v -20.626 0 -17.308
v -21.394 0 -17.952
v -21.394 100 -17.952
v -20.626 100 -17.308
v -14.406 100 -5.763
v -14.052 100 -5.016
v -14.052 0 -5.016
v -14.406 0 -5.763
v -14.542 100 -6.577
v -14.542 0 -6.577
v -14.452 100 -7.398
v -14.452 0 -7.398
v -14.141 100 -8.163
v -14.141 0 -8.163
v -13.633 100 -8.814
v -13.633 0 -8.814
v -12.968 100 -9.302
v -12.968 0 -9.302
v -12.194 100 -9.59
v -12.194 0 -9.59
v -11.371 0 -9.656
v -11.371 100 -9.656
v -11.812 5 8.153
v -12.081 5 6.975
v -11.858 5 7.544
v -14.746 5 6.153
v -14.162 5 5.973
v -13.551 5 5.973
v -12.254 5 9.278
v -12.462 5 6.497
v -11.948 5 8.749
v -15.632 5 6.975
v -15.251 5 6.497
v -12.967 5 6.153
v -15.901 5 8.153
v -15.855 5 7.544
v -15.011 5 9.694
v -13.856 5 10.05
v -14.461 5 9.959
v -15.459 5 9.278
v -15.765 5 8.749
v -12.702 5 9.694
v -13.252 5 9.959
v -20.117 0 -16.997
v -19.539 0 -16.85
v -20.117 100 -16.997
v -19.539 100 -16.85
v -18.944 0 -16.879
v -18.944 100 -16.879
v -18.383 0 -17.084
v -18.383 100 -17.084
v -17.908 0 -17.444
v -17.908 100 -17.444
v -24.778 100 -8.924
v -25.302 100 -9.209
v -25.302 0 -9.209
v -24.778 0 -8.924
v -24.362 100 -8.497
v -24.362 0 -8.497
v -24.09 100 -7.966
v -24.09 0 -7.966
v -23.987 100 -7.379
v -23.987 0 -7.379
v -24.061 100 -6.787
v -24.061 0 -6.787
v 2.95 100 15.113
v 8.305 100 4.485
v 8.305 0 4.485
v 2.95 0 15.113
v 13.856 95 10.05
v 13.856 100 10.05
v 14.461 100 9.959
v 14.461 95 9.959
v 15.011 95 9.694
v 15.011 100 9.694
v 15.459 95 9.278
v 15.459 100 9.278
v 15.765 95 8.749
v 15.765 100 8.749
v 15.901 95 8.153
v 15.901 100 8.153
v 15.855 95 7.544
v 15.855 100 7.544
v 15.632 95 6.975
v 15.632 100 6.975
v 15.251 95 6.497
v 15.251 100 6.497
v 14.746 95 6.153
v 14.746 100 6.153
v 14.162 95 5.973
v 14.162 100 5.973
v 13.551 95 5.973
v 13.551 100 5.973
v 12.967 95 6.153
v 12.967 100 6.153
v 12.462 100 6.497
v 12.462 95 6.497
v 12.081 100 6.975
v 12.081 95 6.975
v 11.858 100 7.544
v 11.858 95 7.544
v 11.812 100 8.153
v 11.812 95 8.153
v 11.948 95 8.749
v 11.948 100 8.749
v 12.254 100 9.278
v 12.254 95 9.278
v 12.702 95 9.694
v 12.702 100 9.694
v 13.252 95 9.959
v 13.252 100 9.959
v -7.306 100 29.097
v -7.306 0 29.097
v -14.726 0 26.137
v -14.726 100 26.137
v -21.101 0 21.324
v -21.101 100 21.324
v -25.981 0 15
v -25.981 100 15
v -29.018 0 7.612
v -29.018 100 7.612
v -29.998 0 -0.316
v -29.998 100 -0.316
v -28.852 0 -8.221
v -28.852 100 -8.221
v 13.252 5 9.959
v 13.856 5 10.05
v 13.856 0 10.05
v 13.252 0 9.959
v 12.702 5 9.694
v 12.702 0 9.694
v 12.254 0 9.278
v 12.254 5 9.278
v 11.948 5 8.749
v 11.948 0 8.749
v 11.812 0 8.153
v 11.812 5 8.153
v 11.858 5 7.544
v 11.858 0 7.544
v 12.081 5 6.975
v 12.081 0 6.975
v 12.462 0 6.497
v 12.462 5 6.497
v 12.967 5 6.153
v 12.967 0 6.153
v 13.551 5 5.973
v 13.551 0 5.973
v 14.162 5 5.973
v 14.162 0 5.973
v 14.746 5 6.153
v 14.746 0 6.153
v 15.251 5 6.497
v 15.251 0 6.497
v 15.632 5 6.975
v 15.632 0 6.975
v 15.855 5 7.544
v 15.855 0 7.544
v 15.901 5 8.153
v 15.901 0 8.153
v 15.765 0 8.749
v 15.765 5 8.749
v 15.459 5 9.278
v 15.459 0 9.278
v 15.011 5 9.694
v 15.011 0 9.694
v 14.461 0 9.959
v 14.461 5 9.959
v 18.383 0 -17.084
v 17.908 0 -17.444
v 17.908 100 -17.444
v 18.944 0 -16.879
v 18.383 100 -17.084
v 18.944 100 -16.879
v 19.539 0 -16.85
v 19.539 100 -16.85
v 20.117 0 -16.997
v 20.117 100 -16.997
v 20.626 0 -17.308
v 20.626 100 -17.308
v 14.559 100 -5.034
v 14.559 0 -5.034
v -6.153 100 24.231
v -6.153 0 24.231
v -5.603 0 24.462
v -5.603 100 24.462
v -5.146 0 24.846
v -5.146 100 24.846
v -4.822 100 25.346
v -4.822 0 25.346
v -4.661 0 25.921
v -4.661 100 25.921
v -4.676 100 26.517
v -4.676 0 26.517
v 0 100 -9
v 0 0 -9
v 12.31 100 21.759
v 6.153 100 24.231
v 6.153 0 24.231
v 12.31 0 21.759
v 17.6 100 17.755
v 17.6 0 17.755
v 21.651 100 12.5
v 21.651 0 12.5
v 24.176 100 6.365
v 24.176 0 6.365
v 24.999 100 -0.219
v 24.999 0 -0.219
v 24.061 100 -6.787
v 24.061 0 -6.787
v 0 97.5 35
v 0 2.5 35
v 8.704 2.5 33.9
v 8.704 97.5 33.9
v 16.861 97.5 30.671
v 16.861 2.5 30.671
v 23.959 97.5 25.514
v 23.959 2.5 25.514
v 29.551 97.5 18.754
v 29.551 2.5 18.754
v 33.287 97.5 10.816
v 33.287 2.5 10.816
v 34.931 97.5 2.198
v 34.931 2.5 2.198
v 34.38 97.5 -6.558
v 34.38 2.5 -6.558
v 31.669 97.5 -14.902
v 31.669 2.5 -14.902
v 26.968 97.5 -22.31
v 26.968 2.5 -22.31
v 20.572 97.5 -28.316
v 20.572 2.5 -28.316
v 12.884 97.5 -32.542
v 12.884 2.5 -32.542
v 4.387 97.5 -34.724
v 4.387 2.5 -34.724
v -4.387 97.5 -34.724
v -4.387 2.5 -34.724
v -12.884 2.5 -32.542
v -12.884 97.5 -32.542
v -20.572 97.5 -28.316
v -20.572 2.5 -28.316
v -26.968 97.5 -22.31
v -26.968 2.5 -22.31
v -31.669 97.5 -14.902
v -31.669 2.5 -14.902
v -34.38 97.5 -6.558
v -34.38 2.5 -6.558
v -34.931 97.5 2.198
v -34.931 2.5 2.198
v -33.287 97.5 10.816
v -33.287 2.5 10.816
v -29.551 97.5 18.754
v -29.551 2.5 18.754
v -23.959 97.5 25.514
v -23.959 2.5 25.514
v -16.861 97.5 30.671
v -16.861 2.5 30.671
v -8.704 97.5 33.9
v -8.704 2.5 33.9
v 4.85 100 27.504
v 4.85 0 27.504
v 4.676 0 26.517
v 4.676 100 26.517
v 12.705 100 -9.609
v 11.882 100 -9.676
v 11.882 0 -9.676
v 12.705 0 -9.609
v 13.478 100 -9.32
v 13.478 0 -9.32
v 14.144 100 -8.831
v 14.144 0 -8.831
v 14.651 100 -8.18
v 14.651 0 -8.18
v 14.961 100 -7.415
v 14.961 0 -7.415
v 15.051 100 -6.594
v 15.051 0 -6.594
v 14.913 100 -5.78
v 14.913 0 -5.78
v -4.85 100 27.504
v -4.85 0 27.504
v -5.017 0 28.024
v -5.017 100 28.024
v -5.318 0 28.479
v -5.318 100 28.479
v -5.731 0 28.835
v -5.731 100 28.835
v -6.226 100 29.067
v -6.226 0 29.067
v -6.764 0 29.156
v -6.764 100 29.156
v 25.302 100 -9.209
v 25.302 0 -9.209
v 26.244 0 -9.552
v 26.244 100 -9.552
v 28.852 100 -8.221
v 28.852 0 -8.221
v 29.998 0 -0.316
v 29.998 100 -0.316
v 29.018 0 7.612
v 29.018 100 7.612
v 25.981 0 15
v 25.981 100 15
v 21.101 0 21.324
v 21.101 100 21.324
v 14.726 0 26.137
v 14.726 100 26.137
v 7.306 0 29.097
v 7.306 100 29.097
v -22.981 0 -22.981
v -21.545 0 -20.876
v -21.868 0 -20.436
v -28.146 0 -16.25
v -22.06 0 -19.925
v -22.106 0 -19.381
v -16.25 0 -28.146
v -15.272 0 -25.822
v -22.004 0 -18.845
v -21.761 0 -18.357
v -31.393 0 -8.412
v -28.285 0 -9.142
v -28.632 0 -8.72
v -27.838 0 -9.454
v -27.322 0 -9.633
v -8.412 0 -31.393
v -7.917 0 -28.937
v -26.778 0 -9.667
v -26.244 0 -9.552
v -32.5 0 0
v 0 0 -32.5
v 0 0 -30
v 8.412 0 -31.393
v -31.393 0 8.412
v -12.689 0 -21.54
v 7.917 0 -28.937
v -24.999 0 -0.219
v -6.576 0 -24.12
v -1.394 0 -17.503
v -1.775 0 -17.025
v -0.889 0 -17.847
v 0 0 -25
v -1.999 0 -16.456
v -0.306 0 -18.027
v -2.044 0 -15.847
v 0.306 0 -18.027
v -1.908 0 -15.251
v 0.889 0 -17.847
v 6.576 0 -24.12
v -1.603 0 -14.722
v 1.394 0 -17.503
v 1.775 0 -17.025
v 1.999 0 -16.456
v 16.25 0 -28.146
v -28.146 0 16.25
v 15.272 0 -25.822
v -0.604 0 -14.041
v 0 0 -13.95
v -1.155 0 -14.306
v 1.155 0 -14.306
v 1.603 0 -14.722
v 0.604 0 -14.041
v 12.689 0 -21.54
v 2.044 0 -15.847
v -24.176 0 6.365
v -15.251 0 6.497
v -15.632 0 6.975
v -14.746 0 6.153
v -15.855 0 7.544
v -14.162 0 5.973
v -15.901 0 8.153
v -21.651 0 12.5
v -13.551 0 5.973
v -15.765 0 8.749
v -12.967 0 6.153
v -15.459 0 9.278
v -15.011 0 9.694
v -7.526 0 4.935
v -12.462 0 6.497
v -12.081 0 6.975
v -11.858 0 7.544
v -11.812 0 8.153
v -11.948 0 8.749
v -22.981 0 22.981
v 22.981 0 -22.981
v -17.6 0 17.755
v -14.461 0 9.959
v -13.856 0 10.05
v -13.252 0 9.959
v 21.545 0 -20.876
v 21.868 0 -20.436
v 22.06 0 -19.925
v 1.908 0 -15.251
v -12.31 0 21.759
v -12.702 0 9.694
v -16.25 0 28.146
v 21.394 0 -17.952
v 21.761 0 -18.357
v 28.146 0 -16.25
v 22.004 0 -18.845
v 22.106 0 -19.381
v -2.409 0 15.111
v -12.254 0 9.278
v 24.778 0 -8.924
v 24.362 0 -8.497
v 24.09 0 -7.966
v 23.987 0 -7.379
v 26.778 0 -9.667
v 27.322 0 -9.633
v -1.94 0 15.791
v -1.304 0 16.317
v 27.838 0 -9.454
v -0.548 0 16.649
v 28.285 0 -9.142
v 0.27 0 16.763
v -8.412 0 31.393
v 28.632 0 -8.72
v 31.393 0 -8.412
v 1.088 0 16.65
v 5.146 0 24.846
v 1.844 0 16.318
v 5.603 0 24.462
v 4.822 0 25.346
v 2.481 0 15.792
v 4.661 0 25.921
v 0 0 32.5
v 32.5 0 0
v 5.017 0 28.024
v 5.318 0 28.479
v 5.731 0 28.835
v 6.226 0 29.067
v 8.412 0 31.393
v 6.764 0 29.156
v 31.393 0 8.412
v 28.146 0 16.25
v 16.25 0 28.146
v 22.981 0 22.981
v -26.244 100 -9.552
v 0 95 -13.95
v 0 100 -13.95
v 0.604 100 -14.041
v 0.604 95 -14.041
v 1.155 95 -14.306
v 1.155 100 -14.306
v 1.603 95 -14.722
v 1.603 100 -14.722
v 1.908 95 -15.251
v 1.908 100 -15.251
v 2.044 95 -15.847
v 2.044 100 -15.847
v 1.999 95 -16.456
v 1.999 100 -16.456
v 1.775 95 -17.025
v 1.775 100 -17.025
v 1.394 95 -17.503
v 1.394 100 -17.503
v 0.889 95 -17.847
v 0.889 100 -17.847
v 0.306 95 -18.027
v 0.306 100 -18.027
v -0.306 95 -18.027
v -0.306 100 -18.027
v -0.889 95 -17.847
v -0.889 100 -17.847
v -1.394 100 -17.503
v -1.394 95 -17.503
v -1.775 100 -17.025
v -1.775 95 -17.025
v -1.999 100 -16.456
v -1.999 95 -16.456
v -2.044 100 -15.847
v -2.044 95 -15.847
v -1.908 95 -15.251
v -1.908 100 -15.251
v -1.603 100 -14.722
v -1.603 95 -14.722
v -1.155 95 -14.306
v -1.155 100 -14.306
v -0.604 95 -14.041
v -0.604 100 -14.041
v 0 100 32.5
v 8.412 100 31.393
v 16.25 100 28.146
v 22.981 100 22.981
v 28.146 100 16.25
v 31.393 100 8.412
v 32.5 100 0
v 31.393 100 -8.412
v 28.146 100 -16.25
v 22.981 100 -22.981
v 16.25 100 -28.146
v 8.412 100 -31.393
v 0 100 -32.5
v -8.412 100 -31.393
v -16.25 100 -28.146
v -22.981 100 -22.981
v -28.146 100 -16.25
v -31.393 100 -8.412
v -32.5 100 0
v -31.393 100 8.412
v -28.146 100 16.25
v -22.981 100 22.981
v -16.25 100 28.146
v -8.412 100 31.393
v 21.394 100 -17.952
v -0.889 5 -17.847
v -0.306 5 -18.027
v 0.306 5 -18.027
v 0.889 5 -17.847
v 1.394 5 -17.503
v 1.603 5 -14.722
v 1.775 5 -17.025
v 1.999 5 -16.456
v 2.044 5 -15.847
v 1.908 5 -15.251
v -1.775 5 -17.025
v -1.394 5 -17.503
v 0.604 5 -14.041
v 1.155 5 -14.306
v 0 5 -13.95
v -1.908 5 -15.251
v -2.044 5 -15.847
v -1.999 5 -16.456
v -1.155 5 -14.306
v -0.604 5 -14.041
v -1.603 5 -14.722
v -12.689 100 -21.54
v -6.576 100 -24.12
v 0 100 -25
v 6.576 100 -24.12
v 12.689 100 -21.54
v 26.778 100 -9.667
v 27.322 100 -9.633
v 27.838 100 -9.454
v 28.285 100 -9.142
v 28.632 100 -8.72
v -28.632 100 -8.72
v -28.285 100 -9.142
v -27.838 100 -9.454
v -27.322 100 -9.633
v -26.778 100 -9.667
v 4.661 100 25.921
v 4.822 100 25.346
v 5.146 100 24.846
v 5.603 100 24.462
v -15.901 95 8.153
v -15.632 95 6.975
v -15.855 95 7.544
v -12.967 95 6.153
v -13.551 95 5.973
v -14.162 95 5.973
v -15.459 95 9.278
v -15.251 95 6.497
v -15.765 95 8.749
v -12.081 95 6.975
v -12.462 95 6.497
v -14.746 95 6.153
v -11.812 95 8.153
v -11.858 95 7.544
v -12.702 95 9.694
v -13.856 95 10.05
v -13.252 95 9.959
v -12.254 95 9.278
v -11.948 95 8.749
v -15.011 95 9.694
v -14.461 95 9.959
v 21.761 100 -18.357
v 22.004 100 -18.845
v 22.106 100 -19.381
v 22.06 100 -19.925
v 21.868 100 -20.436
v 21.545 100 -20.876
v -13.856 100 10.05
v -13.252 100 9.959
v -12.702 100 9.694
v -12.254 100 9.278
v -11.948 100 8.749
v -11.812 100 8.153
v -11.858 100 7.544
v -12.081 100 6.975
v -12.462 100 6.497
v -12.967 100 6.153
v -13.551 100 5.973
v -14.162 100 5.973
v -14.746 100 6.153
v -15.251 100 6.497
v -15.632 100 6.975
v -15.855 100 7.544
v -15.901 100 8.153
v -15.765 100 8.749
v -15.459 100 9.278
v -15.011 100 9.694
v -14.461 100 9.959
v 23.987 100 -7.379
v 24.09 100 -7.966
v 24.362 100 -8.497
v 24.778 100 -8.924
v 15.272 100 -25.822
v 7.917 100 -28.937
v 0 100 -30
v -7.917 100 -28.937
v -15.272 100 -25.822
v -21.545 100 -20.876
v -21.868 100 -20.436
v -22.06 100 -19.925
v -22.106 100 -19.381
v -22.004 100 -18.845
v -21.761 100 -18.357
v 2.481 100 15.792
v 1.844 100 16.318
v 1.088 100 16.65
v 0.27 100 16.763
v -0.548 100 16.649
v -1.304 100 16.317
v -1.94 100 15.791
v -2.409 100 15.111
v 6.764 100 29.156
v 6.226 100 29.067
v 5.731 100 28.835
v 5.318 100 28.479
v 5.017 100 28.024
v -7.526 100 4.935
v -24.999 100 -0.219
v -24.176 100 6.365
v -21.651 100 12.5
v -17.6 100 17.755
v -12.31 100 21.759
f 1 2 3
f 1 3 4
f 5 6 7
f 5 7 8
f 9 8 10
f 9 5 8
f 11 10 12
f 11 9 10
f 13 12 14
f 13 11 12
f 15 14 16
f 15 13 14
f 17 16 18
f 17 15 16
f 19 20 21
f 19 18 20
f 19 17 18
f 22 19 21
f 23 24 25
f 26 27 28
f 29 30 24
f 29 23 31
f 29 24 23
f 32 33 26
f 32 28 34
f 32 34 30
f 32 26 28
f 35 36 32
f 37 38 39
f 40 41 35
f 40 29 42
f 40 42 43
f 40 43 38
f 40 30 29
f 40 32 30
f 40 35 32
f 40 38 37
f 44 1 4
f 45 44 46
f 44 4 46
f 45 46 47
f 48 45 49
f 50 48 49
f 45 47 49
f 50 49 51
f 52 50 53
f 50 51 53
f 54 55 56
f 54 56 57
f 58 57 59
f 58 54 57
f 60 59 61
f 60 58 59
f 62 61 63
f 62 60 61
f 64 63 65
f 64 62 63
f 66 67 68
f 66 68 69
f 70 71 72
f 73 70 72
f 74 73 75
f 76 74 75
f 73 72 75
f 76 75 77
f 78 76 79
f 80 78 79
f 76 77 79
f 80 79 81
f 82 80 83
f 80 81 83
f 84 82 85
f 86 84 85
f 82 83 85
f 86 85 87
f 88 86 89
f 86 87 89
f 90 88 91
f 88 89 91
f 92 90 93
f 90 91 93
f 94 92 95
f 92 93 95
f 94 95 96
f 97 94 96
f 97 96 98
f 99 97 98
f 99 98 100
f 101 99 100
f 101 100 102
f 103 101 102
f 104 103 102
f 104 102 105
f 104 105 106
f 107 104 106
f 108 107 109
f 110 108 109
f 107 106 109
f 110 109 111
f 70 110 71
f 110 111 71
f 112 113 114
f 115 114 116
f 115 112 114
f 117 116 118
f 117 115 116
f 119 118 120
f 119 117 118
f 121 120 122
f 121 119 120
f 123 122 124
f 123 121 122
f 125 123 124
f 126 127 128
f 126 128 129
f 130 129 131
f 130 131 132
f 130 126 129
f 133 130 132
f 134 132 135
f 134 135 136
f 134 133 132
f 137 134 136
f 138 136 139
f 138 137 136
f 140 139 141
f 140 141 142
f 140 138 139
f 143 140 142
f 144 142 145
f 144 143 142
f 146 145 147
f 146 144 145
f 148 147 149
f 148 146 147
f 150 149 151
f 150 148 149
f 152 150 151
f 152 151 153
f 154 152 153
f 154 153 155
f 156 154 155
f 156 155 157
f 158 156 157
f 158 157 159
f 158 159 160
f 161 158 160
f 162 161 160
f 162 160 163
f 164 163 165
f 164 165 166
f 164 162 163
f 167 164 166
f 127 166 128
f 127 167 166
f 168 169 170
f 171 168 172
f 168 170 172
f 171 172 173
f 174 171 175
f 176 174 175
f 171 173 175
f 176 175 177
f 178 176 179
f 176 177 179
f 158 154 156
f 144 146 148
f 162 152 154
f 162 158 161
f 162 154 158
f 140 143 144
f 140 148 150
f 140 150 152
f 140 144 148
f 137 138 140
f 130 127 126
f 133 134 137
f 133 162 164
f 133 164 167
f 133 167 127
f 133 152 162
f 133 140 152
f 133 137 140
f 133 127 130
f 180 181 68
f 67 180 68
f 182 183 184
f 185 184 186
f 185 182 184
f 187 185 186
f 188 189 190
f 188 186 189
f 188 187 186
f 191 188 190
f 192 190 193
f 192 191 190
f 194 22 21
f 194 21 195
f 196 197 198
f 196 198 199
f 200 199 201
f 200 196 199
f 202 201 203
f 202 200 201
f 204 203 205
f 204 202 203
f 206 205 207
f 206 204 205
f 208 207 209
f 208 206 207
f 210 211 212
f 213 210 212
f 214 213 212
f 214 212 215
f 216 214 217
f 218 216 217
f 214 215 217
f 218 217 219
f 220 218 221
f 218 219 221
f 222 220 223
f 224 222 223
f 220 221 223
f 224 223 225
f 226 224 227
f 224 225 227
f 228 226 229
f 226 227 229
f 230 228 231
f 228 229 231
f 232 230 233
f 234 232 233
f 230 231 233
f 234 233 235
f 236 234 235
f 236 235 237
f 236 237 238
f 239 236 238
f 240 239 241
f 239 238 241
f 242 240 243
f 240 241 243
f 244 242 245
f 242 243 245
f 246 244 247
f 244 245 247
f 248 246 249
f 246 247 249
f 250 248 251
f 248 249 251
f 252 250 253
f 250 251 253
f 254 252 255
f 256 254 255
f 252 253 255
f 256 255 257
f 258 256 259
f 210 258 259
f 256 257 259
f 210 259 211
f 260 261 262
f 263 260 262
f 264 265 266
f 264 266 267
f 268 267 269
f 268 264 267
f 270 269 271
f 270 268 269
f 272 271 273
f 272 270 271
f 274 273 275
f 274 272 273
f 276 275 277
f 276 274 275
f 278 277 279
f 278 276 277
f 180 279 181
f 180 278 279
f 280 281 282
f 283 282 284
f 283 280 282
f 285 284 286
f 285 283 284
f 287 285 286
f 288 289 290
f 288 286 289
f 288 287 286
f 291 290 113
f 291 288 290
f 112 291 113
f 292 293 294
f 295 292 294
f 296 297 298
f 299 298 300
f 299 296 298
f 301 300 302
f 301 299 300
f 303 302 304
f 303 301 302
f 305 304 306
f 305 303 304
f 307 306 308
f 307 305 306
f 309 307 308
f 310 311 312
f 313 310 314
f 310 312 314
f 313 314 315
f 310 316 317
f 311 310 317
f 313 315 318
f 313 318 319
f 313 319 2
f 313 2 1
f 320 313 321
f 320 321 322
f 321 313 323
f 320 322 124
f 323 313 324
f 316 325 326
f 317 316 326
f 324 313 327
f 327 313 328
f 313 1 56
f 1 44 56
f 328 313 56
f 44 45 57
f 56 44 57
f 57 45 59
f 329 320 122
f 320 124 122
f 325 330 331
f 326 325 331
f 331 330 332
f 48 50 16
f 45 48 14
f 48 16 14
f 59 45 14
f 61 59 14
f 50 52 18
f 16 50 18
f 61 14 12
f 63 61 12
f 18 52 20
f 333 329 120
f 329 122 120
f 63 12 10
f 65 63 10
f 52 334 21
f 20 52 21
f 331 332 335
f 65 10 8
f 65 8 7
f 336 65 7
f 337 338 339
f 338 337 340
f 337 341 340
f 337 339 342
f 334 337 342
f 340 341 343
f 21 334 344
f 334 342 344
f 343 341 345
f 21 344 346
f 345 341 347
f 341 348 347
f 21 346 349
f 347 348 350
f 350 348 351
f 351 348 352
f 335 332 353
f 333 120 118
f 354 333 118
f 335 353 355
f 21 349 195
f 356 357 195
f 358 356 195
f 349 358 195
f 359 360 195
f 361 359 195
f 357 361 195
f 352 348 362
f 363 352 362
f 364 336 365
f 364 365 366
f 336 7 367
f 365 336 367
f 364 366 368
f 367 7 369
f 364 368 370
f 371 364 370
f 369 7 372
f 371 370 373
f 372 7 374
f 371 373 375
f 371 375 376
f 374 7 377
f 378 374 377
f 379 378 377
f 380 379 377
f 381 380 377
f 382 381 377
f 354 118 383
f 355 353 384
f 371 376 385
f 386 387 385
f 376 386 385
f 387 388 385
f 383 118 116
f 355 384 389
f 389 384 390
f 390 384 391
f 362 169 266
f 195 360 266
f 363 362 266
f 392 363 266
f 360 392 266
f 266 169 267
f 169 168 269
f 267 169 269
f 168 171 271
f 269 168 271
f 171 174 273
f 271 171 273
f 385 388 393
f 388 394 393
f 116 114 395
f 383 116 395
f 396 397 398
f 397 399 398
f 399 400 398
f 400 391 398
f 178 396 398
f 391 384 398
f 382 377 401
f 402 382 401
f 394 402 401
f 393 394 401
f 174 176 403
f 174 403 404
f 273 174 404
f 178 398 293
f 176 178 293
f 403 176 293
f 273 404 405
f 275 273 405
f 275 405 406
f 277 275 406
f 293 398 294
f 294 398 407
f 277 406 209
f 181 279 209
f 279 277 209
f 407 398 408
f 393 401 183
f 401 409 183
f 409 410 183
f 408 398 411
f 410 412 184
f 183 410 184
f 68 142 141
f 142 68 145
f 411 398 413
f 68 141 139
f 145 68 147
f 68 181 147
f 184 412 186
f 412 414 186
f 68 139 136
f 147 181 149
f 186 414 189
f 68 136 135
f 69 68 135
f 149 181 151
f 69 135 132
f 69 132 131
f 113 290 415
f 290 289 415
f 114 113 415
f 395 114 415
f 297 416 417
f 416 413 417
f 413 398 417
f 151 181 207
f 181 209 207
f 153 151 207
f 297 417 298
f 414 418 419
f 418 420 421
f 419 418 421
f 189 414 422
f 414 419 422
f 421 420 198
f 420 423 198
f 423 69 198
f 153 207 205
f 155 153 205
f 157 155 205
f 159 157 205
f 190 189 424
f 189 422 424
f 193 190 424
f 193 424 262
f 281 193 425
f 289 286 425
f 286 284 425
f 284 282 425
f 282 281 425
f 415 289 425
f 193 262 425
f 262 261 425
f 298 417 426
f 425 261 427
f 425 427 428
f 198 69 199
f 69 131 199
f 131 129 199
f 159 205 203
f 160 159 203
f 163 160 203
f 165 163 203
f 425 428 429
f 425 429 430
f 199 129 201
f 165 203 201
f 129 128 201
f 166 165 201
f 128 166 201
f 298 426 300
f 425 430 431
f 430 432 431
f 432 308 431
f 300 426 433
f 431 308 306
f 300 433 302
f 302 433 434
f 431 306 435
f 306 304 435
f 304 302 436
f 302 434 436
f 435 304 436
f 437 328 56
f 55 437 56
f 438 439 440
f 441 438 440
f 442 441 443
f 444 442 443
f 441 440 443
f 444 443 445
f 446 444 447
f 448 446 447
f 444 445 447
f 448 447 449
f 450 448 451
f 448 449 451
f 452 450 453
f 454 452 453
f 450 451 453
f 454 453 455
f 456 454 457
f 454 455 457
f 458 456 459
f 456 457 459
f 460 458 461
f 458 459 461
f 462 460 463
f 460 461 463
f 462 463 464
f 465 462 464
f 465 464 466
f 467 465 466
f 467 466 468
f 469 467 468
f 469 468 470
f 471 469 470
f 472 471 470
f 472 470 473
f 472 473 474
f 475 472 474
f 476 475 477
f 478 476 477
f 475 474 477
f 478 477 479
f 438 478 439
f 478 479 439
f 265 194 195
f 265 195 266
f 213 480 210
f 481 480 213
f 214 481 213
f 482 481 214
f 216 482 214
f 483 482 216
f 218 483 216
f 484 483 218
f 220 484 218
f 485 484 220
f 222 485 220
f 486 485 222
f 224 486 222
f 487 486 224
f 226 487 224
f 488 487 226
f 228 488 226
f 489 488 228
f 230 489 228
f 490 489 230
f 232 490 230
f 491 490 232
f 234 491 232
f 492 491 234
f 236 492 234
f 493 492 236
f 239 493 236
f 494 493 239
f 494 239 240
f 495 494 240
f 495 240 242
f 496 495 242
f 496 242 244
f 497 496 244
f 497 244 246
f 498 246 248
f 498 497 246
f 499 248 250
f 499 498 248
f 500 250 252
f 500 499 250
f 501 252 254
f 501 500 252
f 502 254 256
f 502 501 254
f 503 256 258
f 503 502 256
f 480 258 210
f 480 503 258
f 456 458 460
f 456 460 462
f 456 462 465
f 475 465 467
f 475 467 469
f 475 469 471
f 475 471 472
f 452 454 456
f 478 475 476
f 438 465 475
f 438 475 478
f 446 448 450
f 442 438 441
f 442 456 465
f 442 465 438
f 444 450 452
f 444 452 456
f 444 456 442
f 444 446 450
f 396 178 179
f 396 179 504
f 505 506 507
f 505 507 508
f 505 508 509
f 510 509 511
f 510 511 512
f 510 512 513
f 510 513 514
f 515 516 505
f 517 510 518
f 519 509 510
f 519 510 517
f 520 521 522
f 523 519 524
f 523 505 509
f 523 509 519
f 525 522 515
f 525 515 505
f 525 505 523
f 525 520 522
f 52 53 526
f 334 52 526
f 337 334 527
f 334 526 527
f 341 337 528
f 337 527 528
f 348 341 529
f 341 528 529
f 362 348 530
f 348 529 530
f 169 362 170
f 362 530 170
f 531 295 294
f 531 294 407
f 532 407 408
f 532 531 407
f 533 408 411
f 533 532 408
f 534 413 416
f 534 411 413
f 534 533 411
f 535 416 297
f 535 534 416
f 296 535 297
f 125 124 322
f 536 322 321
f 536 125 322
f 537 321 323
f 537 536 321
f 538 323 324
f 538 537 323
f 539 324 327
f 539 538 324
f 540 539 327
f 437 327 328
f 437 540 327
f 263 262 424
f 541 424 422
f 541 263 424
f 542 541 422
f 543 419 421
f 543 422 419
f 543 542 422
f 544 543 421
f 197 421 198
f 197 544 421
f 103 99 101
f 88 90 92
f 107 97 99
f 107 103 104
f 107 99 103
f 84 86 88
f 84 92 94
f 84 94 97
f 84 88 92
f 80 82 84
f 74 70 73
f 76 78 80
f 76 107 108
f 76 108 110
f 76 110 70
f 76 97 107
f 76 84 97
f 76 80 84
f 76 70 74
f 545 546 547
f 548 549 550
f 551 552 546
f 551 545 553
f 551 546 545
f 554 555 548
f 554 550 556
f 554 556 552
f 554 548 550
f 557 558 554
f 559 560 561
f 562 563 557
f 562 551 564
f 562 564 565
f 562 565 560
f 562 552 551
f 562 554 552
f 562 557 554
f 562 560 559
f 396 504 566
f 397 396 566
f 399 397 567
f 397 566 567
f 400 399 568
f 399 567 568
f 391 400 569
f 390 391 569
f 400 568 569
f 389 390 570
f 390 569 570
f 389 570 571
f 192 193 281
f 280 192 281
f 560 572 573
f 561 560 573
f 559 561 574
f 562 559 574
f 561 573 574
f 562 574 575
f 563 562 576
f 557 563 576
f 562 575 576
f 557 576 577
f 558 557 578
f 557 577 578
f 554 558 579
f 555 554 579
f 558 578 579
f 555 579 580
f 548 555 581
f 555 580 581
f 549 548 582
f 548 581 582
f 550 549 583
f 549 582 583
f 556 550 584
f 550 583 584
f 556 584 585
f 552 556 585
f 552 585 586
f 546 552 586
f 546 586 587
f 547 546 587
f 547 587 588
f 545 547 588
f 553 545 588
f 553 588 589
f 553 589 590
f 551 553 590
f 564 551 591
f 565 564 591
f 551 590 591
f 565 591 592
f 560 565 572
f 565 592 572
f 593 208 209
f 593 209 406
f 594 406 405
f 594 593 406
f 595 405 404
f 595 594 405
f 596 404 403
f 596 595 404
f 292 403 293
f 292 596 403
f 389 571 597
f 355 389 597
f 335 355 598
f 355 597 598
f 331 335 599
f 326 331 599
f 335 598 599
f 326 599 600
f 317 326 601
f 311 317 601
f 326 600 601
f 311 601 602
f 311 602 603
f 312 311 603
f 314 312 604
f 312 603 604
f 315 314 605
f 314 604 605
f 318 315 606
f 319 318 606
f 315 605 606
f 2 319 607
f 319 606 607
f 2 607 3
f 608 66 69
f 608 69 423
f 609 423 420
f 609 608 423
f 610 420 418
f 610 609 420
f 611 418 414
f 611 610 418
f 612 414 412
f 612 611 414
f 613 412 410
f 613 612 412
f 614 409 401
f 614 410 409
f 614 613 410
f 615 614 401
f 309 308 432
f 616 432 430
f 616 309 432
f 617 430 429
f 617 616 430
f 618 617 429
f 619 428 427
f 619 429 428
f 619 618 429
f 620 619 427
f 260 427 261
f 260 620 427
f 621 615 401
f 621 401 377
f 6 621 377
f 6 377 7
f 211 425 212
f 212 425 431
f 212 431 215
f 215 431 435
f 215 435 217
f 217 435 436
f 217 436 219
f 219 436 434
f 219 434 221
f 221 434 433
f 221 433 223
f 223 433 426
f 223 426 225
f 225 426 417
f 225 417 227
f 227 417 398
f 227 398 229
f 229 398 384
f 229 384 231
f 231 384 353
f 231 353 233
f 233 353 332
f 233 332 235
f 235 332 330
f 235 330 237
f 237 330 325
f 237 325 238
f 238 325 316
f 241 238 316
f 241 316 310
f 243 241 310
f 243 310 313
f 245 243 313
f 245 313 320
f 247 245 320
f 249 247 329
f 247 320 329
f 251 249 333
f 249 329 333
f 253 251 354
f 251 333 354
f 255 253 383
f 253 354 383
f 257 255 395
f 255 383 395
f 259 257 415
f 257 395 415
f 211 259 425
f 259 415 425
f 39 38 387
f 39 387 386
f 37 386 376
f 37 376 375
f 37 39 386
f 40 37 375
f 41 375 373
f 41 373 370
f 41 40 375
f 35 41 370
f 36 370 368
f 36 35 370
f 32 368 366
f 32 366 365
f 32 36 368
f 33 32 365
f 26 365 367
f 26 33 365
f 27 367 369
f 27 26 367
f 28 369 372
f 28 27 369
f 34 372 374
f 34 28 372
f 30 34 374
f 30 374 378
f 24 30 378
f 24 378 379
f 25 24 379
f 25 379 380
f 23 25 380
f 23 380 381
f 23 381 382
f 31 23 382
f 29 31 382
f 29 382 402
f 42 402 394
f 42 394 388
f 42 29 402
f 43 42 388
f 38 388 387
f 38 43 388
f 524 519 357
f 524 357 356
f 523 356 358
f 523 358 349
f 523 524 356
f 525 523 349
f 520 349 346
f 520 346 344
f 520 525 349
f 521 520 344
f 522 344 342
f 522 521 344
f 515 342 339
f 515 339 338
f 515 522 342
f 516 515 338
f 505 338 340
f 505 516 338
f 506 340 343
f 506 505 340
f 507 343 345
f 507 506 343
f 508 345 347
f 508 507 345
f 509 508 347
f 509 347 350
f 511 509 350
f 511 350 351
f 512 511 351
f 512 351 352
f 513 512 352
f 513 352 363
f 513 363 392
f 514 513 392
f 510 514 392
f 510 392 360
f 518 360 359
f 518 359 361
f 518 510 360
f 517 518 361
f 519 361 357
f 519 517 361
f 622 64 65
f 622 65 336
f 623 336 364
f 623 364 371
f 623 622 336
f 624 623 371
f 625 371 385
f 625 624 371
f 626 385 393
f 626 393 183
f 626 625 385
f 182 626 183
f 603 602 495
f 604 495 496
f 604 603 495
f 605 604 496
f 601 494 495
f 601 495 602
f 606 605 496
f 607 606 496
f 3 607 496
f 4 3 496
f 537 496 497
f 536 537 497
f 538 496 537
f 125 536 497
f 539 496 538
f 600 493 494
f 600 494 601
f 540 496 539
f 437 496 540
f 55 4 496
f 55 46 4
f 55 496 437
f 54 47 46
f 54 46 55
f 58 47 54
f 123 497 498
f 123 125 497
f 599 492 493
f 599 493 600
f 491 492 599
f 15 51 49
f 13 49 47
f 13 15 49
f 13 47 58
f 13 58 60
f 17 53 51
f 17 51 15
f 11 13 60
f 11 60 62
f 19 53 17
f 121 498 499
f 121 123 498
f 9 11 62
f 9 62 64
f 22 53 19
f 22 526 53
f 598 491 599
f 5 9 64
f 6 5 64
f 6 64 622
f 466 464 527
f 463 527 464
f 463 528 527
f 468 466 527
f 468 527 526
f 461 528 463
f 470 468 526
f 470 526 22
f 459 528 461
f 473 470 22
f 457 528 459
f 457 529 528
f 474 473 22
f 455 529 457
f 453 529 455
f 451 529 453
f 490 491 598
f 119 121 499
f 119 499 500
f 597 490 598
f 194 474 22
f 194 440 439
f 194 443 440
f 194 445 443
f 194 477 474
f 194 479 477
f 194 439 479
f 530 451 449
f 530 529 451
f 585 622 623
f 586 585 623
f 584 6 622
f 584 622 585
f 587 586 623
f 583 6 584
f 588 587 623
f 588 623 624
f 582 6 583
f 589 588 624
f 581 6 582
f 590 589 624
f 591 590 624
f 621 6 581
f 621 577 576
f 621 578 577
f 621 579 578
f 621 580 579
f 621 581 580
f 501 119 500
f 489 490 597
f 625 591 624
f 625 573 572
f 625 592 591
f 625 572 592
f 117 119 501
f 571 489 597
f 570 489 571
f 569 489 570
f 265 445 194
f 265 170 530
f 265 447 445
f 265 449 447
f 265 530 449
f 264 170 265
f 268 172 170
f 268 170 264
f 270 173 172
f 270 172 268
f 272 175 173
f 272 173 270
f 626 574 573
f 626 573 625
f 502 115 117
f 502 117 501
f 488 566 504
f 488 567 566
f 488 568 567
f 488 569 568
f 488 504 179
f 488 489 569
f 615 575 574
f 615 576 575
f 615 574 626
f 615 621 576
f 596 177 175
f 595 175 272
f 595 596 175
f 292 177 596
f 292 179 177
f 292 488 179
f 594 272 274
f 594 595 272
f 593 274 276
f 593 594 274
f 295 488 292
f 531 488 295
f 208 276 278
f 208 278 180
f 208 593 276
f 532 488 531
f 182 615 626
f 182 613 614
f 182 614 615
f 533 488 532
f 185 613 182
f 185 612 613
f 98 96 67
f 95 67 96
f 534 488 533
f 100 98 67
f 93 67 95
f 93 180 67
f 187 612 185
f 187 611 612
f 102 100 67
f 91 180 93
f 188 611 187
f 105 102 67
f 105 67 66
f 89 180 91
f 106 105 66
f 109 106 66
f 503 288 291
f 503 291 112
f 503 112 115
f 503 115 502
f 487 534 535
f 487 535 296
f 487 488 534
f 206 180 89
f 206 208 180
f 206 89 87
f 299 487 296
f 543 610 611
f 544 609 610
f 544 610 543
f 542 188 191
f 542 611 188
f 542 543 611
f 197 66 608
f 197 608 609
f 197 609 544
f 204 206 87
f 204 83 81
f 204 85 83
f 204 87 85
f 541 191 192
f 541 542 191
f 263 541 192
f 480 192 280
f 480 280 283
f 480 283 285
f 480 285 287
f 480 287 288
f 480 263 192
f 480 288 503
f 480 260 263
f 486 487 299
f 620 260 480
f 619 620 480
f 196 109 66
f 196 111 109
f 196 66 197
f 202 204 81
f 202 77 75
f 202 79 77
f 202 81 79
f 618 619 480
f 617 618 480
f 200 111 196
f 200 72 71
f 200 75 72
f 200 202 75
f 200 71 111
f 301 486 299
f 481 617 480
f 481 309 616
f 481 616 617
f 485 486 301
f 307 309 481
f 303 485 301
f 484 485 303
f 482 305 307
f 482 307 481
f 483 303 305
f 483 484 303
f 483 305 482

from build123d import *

# Parameters (mm, degrees)
SKETCH_1_R          = 35
EXTRUDE_1_DEPTH     = 100
SKETCH_2_R          = 2.05
CUT_EXTRUDE_1_DEPTH = 5
CHAMFER_1_SIZE      = 2.5
CUT_EXTRUDE_START   = -5
SKETCH_3_R          = 2.05
CUT_EXTRUDE_2_DEPTH = 5
CUT_EXTRUDE_3_DEPTH = 112.579568022


with BuildPart() as part:
    # ｽｹｯﾁ1 → ﾎﾞｽ - 押し出し1 (new body)
    with BuildSketch(Plane(origin=(0, 0, 0), x_dir=(1, 0, 0), z_dir=(0, 1, 0))):
        with Locations(Location((0, 0, 0), (0, 0, 270))):
            Circle(SKETCH_1_R)
    extrude(amount=EXTRUDE_1_DEPTH)

    # ｽｹｯﾁ2 → ｶｯﾄ - 押し出し1 (cut)
    with BuildSketch(Plane(origin=(0, 100, 0), x_dir=(1, 0, 0), z_dir=(0, 1, 0))):
        with Locations(Location((0, 16, 0), (0, 0, 270))):
            Circle(SKETCH_2_R)
        with Locations(Location((13.856406461, -8, 0), (0, 0, 270))):
            Circle(SKETCH_2_R)
        with Locations(Location((-13.856406461, -8, 0), (0, 0, 270))):
            Circle(SKETCH_2_R)
    extrude(amount=-CUT_EXTRUDE_1_DEPTH, mode=Mode.SUBTRACT)

    # 面取り1
    chamfer_1_edges = [part.edges().sort_by_distance(p)[0] for p in [
        (0, 0, -35),
        (0, 100, -35),
    ]]
    chamfer(chamfer_1_edges, length=CHAMFER_1_SIZE)

    # ｽｹｯﾁ3 → ｶｯﾄ - 押し出し2 (cut)
    with BuildSketch(Plane.XZ.offset(CUT_EXTRUDE_START)):
        with Locations(Location((0, -16, 0), (0, 0, 90))):
            Circle(SKETCH_3_R)
        with Locations(Location((-13.856406461, 8, 0), (0, 0, 90))):
            Circle(SKETCH_3_R)
        with Locations(Location((13.856406461, 8, 0), (0, 0, 90))):
            Circle(SKETCH_3_R)
    extrude(amount=CUT_EXTRUDE_2_DEPTH, mode=Mode.SUBTRACT)

    # ｽｹｯﾁ4 → ｶｯﾄ - 押し出し3 (cut, through all)
    with BuildSketch(Plane(origin=(0, 100, 0), x_dir=(1, 0, 0), z_dir=(0, 1, 0))):
        with BuildLine():
            Line((-21.394456976, 17.952080958), (-20.626377879, 17.307586071))
            ThreePointArc((-20.626377879, 17.307586071), (-19.240453869, 16.842194013), (-17.908150611, 17.444143479))
            ThreePointArc((-17.908150611, 17.444143479), (0, 25), (17.908150611, 17.444143479))
            ThreePointArc((17.908150611, 17.444143479), (19.240453869, 16.842194013), (20.626377879, 17.307586071))
            Line((20.626377879, 17.307586071), (21.394456976, 17.952080958))
            ThreePointArc((21.394456976, 17.952080958), (22.106227854, 19.38117195), (21.545230453, 20.875896261))
            ThreePointArc((21.545230453, 20.875896261), (0, 30), (-21.545230453, 20.875896261))
            ThreePointArc((-21.545230453, 20.875896261), (-22.106227854, 19.38117195), (-21.394456976, 17.952080958))
        make_face()
        with BuildLine():
            Line((4.849729672, -27.50418372), (4.675620276, -26.516760267))
            ThreePointArc((4.675620276, -26.516760267), (4.965540937, -25.083818837), (6.152996094, -24.230985103))
            ThreePointArc((6.152996094, -24.230985103), (21.650635095, -12.5), (24.061146705, 6.786841624))
            ThreePointArc((24.061146705, 6.786841624), (24.205994805, 8.241624824), (25.301998155, 9.209174196))
            Line((25.301998155, 9.209174196), (26.244186648, 9.552102762))
            ThreePointArc((26.244186648, 9.552102762), (27.837701191, 9.453968928), (28.851671716, 8.220768772))
            ThreePointArc((28.851671716, 8.220768772), (25.980762114, -15), (7.306441262, -29.096665034))
            ThreePointArc((7.306441262, -29.096665034), (5.731473337, -28.835140879), (4.849729672, -27.50418372))
        make_face()
        with BuildLine():
            Line((-26.244186648, 9.552102762), (-25.301998155, 9.209174196))
            ThreePointArc((-25.301998155, 9.209174196), (-24.205994805, 8.241624824), (-24.061146705, 6.786841624))
            ThreePointArc((-24.061146705, 6.786841624), (-21.650635095, -12.5), (-6.152996094, -24.230985103))
            ThreePointArc((-6.152996094, -24.230985103), (-4.965540937, -25.083818837), (-4.675620276, -26.516760267))
            Line((-4.675620276, -26.516760267), (-4.849729672, -27.50418372))
            ThreePointArc((-4.849729672, -27.50418372), (-5.731473337, -28.835140879), (-7.306441262, -29.096665034))
            ThreePointArc((-7.306441262, -29.096665034), (-25.980762114, -15), (-28.851671716, 8.220768772))
            ThreePointArc((-28.851671716, 8.220768772), (-27.837701191, 9.453968928), (-26.244186648, 9.552102762))
        make_face()
        with BuildLine():
            Line((-7.526031383, -4.935468734), (-14.052277383, 5.016317986))
            ThreePointArc((-14.052277383, 5.016317986), (-14.141048063, 8.162562133), (-11.37068313, 9.656486697))
            Line((-11.37068313, 9.656486697), (0, 9))
            Line((0, 9), (11.881623113, 9.676001467))
            ThreePointArc((11.881623113, 9.676001467), (14.65073581, 8.179757058), (14.559329968, 5.033588367))
            Line((14.559329968, 5.033588367), (8.305454246, -4.485468734))
            Line((8.305454246, -4.485468734), (2.950077133, -15.113256922))
            ThreePointArc((2.950077133, -15.113256922), (0.269735116, -16.763256659), (-2.409223974, -15.111012532))
            Line((-2.409223974, -15.111012532), (-7.526031383, -4.935468734))
        make_face()
    extrude(amount=-CUT_EXTRUDE_3_DEPTH, mode=Mode.SUBTRACT)


solid = part.part
